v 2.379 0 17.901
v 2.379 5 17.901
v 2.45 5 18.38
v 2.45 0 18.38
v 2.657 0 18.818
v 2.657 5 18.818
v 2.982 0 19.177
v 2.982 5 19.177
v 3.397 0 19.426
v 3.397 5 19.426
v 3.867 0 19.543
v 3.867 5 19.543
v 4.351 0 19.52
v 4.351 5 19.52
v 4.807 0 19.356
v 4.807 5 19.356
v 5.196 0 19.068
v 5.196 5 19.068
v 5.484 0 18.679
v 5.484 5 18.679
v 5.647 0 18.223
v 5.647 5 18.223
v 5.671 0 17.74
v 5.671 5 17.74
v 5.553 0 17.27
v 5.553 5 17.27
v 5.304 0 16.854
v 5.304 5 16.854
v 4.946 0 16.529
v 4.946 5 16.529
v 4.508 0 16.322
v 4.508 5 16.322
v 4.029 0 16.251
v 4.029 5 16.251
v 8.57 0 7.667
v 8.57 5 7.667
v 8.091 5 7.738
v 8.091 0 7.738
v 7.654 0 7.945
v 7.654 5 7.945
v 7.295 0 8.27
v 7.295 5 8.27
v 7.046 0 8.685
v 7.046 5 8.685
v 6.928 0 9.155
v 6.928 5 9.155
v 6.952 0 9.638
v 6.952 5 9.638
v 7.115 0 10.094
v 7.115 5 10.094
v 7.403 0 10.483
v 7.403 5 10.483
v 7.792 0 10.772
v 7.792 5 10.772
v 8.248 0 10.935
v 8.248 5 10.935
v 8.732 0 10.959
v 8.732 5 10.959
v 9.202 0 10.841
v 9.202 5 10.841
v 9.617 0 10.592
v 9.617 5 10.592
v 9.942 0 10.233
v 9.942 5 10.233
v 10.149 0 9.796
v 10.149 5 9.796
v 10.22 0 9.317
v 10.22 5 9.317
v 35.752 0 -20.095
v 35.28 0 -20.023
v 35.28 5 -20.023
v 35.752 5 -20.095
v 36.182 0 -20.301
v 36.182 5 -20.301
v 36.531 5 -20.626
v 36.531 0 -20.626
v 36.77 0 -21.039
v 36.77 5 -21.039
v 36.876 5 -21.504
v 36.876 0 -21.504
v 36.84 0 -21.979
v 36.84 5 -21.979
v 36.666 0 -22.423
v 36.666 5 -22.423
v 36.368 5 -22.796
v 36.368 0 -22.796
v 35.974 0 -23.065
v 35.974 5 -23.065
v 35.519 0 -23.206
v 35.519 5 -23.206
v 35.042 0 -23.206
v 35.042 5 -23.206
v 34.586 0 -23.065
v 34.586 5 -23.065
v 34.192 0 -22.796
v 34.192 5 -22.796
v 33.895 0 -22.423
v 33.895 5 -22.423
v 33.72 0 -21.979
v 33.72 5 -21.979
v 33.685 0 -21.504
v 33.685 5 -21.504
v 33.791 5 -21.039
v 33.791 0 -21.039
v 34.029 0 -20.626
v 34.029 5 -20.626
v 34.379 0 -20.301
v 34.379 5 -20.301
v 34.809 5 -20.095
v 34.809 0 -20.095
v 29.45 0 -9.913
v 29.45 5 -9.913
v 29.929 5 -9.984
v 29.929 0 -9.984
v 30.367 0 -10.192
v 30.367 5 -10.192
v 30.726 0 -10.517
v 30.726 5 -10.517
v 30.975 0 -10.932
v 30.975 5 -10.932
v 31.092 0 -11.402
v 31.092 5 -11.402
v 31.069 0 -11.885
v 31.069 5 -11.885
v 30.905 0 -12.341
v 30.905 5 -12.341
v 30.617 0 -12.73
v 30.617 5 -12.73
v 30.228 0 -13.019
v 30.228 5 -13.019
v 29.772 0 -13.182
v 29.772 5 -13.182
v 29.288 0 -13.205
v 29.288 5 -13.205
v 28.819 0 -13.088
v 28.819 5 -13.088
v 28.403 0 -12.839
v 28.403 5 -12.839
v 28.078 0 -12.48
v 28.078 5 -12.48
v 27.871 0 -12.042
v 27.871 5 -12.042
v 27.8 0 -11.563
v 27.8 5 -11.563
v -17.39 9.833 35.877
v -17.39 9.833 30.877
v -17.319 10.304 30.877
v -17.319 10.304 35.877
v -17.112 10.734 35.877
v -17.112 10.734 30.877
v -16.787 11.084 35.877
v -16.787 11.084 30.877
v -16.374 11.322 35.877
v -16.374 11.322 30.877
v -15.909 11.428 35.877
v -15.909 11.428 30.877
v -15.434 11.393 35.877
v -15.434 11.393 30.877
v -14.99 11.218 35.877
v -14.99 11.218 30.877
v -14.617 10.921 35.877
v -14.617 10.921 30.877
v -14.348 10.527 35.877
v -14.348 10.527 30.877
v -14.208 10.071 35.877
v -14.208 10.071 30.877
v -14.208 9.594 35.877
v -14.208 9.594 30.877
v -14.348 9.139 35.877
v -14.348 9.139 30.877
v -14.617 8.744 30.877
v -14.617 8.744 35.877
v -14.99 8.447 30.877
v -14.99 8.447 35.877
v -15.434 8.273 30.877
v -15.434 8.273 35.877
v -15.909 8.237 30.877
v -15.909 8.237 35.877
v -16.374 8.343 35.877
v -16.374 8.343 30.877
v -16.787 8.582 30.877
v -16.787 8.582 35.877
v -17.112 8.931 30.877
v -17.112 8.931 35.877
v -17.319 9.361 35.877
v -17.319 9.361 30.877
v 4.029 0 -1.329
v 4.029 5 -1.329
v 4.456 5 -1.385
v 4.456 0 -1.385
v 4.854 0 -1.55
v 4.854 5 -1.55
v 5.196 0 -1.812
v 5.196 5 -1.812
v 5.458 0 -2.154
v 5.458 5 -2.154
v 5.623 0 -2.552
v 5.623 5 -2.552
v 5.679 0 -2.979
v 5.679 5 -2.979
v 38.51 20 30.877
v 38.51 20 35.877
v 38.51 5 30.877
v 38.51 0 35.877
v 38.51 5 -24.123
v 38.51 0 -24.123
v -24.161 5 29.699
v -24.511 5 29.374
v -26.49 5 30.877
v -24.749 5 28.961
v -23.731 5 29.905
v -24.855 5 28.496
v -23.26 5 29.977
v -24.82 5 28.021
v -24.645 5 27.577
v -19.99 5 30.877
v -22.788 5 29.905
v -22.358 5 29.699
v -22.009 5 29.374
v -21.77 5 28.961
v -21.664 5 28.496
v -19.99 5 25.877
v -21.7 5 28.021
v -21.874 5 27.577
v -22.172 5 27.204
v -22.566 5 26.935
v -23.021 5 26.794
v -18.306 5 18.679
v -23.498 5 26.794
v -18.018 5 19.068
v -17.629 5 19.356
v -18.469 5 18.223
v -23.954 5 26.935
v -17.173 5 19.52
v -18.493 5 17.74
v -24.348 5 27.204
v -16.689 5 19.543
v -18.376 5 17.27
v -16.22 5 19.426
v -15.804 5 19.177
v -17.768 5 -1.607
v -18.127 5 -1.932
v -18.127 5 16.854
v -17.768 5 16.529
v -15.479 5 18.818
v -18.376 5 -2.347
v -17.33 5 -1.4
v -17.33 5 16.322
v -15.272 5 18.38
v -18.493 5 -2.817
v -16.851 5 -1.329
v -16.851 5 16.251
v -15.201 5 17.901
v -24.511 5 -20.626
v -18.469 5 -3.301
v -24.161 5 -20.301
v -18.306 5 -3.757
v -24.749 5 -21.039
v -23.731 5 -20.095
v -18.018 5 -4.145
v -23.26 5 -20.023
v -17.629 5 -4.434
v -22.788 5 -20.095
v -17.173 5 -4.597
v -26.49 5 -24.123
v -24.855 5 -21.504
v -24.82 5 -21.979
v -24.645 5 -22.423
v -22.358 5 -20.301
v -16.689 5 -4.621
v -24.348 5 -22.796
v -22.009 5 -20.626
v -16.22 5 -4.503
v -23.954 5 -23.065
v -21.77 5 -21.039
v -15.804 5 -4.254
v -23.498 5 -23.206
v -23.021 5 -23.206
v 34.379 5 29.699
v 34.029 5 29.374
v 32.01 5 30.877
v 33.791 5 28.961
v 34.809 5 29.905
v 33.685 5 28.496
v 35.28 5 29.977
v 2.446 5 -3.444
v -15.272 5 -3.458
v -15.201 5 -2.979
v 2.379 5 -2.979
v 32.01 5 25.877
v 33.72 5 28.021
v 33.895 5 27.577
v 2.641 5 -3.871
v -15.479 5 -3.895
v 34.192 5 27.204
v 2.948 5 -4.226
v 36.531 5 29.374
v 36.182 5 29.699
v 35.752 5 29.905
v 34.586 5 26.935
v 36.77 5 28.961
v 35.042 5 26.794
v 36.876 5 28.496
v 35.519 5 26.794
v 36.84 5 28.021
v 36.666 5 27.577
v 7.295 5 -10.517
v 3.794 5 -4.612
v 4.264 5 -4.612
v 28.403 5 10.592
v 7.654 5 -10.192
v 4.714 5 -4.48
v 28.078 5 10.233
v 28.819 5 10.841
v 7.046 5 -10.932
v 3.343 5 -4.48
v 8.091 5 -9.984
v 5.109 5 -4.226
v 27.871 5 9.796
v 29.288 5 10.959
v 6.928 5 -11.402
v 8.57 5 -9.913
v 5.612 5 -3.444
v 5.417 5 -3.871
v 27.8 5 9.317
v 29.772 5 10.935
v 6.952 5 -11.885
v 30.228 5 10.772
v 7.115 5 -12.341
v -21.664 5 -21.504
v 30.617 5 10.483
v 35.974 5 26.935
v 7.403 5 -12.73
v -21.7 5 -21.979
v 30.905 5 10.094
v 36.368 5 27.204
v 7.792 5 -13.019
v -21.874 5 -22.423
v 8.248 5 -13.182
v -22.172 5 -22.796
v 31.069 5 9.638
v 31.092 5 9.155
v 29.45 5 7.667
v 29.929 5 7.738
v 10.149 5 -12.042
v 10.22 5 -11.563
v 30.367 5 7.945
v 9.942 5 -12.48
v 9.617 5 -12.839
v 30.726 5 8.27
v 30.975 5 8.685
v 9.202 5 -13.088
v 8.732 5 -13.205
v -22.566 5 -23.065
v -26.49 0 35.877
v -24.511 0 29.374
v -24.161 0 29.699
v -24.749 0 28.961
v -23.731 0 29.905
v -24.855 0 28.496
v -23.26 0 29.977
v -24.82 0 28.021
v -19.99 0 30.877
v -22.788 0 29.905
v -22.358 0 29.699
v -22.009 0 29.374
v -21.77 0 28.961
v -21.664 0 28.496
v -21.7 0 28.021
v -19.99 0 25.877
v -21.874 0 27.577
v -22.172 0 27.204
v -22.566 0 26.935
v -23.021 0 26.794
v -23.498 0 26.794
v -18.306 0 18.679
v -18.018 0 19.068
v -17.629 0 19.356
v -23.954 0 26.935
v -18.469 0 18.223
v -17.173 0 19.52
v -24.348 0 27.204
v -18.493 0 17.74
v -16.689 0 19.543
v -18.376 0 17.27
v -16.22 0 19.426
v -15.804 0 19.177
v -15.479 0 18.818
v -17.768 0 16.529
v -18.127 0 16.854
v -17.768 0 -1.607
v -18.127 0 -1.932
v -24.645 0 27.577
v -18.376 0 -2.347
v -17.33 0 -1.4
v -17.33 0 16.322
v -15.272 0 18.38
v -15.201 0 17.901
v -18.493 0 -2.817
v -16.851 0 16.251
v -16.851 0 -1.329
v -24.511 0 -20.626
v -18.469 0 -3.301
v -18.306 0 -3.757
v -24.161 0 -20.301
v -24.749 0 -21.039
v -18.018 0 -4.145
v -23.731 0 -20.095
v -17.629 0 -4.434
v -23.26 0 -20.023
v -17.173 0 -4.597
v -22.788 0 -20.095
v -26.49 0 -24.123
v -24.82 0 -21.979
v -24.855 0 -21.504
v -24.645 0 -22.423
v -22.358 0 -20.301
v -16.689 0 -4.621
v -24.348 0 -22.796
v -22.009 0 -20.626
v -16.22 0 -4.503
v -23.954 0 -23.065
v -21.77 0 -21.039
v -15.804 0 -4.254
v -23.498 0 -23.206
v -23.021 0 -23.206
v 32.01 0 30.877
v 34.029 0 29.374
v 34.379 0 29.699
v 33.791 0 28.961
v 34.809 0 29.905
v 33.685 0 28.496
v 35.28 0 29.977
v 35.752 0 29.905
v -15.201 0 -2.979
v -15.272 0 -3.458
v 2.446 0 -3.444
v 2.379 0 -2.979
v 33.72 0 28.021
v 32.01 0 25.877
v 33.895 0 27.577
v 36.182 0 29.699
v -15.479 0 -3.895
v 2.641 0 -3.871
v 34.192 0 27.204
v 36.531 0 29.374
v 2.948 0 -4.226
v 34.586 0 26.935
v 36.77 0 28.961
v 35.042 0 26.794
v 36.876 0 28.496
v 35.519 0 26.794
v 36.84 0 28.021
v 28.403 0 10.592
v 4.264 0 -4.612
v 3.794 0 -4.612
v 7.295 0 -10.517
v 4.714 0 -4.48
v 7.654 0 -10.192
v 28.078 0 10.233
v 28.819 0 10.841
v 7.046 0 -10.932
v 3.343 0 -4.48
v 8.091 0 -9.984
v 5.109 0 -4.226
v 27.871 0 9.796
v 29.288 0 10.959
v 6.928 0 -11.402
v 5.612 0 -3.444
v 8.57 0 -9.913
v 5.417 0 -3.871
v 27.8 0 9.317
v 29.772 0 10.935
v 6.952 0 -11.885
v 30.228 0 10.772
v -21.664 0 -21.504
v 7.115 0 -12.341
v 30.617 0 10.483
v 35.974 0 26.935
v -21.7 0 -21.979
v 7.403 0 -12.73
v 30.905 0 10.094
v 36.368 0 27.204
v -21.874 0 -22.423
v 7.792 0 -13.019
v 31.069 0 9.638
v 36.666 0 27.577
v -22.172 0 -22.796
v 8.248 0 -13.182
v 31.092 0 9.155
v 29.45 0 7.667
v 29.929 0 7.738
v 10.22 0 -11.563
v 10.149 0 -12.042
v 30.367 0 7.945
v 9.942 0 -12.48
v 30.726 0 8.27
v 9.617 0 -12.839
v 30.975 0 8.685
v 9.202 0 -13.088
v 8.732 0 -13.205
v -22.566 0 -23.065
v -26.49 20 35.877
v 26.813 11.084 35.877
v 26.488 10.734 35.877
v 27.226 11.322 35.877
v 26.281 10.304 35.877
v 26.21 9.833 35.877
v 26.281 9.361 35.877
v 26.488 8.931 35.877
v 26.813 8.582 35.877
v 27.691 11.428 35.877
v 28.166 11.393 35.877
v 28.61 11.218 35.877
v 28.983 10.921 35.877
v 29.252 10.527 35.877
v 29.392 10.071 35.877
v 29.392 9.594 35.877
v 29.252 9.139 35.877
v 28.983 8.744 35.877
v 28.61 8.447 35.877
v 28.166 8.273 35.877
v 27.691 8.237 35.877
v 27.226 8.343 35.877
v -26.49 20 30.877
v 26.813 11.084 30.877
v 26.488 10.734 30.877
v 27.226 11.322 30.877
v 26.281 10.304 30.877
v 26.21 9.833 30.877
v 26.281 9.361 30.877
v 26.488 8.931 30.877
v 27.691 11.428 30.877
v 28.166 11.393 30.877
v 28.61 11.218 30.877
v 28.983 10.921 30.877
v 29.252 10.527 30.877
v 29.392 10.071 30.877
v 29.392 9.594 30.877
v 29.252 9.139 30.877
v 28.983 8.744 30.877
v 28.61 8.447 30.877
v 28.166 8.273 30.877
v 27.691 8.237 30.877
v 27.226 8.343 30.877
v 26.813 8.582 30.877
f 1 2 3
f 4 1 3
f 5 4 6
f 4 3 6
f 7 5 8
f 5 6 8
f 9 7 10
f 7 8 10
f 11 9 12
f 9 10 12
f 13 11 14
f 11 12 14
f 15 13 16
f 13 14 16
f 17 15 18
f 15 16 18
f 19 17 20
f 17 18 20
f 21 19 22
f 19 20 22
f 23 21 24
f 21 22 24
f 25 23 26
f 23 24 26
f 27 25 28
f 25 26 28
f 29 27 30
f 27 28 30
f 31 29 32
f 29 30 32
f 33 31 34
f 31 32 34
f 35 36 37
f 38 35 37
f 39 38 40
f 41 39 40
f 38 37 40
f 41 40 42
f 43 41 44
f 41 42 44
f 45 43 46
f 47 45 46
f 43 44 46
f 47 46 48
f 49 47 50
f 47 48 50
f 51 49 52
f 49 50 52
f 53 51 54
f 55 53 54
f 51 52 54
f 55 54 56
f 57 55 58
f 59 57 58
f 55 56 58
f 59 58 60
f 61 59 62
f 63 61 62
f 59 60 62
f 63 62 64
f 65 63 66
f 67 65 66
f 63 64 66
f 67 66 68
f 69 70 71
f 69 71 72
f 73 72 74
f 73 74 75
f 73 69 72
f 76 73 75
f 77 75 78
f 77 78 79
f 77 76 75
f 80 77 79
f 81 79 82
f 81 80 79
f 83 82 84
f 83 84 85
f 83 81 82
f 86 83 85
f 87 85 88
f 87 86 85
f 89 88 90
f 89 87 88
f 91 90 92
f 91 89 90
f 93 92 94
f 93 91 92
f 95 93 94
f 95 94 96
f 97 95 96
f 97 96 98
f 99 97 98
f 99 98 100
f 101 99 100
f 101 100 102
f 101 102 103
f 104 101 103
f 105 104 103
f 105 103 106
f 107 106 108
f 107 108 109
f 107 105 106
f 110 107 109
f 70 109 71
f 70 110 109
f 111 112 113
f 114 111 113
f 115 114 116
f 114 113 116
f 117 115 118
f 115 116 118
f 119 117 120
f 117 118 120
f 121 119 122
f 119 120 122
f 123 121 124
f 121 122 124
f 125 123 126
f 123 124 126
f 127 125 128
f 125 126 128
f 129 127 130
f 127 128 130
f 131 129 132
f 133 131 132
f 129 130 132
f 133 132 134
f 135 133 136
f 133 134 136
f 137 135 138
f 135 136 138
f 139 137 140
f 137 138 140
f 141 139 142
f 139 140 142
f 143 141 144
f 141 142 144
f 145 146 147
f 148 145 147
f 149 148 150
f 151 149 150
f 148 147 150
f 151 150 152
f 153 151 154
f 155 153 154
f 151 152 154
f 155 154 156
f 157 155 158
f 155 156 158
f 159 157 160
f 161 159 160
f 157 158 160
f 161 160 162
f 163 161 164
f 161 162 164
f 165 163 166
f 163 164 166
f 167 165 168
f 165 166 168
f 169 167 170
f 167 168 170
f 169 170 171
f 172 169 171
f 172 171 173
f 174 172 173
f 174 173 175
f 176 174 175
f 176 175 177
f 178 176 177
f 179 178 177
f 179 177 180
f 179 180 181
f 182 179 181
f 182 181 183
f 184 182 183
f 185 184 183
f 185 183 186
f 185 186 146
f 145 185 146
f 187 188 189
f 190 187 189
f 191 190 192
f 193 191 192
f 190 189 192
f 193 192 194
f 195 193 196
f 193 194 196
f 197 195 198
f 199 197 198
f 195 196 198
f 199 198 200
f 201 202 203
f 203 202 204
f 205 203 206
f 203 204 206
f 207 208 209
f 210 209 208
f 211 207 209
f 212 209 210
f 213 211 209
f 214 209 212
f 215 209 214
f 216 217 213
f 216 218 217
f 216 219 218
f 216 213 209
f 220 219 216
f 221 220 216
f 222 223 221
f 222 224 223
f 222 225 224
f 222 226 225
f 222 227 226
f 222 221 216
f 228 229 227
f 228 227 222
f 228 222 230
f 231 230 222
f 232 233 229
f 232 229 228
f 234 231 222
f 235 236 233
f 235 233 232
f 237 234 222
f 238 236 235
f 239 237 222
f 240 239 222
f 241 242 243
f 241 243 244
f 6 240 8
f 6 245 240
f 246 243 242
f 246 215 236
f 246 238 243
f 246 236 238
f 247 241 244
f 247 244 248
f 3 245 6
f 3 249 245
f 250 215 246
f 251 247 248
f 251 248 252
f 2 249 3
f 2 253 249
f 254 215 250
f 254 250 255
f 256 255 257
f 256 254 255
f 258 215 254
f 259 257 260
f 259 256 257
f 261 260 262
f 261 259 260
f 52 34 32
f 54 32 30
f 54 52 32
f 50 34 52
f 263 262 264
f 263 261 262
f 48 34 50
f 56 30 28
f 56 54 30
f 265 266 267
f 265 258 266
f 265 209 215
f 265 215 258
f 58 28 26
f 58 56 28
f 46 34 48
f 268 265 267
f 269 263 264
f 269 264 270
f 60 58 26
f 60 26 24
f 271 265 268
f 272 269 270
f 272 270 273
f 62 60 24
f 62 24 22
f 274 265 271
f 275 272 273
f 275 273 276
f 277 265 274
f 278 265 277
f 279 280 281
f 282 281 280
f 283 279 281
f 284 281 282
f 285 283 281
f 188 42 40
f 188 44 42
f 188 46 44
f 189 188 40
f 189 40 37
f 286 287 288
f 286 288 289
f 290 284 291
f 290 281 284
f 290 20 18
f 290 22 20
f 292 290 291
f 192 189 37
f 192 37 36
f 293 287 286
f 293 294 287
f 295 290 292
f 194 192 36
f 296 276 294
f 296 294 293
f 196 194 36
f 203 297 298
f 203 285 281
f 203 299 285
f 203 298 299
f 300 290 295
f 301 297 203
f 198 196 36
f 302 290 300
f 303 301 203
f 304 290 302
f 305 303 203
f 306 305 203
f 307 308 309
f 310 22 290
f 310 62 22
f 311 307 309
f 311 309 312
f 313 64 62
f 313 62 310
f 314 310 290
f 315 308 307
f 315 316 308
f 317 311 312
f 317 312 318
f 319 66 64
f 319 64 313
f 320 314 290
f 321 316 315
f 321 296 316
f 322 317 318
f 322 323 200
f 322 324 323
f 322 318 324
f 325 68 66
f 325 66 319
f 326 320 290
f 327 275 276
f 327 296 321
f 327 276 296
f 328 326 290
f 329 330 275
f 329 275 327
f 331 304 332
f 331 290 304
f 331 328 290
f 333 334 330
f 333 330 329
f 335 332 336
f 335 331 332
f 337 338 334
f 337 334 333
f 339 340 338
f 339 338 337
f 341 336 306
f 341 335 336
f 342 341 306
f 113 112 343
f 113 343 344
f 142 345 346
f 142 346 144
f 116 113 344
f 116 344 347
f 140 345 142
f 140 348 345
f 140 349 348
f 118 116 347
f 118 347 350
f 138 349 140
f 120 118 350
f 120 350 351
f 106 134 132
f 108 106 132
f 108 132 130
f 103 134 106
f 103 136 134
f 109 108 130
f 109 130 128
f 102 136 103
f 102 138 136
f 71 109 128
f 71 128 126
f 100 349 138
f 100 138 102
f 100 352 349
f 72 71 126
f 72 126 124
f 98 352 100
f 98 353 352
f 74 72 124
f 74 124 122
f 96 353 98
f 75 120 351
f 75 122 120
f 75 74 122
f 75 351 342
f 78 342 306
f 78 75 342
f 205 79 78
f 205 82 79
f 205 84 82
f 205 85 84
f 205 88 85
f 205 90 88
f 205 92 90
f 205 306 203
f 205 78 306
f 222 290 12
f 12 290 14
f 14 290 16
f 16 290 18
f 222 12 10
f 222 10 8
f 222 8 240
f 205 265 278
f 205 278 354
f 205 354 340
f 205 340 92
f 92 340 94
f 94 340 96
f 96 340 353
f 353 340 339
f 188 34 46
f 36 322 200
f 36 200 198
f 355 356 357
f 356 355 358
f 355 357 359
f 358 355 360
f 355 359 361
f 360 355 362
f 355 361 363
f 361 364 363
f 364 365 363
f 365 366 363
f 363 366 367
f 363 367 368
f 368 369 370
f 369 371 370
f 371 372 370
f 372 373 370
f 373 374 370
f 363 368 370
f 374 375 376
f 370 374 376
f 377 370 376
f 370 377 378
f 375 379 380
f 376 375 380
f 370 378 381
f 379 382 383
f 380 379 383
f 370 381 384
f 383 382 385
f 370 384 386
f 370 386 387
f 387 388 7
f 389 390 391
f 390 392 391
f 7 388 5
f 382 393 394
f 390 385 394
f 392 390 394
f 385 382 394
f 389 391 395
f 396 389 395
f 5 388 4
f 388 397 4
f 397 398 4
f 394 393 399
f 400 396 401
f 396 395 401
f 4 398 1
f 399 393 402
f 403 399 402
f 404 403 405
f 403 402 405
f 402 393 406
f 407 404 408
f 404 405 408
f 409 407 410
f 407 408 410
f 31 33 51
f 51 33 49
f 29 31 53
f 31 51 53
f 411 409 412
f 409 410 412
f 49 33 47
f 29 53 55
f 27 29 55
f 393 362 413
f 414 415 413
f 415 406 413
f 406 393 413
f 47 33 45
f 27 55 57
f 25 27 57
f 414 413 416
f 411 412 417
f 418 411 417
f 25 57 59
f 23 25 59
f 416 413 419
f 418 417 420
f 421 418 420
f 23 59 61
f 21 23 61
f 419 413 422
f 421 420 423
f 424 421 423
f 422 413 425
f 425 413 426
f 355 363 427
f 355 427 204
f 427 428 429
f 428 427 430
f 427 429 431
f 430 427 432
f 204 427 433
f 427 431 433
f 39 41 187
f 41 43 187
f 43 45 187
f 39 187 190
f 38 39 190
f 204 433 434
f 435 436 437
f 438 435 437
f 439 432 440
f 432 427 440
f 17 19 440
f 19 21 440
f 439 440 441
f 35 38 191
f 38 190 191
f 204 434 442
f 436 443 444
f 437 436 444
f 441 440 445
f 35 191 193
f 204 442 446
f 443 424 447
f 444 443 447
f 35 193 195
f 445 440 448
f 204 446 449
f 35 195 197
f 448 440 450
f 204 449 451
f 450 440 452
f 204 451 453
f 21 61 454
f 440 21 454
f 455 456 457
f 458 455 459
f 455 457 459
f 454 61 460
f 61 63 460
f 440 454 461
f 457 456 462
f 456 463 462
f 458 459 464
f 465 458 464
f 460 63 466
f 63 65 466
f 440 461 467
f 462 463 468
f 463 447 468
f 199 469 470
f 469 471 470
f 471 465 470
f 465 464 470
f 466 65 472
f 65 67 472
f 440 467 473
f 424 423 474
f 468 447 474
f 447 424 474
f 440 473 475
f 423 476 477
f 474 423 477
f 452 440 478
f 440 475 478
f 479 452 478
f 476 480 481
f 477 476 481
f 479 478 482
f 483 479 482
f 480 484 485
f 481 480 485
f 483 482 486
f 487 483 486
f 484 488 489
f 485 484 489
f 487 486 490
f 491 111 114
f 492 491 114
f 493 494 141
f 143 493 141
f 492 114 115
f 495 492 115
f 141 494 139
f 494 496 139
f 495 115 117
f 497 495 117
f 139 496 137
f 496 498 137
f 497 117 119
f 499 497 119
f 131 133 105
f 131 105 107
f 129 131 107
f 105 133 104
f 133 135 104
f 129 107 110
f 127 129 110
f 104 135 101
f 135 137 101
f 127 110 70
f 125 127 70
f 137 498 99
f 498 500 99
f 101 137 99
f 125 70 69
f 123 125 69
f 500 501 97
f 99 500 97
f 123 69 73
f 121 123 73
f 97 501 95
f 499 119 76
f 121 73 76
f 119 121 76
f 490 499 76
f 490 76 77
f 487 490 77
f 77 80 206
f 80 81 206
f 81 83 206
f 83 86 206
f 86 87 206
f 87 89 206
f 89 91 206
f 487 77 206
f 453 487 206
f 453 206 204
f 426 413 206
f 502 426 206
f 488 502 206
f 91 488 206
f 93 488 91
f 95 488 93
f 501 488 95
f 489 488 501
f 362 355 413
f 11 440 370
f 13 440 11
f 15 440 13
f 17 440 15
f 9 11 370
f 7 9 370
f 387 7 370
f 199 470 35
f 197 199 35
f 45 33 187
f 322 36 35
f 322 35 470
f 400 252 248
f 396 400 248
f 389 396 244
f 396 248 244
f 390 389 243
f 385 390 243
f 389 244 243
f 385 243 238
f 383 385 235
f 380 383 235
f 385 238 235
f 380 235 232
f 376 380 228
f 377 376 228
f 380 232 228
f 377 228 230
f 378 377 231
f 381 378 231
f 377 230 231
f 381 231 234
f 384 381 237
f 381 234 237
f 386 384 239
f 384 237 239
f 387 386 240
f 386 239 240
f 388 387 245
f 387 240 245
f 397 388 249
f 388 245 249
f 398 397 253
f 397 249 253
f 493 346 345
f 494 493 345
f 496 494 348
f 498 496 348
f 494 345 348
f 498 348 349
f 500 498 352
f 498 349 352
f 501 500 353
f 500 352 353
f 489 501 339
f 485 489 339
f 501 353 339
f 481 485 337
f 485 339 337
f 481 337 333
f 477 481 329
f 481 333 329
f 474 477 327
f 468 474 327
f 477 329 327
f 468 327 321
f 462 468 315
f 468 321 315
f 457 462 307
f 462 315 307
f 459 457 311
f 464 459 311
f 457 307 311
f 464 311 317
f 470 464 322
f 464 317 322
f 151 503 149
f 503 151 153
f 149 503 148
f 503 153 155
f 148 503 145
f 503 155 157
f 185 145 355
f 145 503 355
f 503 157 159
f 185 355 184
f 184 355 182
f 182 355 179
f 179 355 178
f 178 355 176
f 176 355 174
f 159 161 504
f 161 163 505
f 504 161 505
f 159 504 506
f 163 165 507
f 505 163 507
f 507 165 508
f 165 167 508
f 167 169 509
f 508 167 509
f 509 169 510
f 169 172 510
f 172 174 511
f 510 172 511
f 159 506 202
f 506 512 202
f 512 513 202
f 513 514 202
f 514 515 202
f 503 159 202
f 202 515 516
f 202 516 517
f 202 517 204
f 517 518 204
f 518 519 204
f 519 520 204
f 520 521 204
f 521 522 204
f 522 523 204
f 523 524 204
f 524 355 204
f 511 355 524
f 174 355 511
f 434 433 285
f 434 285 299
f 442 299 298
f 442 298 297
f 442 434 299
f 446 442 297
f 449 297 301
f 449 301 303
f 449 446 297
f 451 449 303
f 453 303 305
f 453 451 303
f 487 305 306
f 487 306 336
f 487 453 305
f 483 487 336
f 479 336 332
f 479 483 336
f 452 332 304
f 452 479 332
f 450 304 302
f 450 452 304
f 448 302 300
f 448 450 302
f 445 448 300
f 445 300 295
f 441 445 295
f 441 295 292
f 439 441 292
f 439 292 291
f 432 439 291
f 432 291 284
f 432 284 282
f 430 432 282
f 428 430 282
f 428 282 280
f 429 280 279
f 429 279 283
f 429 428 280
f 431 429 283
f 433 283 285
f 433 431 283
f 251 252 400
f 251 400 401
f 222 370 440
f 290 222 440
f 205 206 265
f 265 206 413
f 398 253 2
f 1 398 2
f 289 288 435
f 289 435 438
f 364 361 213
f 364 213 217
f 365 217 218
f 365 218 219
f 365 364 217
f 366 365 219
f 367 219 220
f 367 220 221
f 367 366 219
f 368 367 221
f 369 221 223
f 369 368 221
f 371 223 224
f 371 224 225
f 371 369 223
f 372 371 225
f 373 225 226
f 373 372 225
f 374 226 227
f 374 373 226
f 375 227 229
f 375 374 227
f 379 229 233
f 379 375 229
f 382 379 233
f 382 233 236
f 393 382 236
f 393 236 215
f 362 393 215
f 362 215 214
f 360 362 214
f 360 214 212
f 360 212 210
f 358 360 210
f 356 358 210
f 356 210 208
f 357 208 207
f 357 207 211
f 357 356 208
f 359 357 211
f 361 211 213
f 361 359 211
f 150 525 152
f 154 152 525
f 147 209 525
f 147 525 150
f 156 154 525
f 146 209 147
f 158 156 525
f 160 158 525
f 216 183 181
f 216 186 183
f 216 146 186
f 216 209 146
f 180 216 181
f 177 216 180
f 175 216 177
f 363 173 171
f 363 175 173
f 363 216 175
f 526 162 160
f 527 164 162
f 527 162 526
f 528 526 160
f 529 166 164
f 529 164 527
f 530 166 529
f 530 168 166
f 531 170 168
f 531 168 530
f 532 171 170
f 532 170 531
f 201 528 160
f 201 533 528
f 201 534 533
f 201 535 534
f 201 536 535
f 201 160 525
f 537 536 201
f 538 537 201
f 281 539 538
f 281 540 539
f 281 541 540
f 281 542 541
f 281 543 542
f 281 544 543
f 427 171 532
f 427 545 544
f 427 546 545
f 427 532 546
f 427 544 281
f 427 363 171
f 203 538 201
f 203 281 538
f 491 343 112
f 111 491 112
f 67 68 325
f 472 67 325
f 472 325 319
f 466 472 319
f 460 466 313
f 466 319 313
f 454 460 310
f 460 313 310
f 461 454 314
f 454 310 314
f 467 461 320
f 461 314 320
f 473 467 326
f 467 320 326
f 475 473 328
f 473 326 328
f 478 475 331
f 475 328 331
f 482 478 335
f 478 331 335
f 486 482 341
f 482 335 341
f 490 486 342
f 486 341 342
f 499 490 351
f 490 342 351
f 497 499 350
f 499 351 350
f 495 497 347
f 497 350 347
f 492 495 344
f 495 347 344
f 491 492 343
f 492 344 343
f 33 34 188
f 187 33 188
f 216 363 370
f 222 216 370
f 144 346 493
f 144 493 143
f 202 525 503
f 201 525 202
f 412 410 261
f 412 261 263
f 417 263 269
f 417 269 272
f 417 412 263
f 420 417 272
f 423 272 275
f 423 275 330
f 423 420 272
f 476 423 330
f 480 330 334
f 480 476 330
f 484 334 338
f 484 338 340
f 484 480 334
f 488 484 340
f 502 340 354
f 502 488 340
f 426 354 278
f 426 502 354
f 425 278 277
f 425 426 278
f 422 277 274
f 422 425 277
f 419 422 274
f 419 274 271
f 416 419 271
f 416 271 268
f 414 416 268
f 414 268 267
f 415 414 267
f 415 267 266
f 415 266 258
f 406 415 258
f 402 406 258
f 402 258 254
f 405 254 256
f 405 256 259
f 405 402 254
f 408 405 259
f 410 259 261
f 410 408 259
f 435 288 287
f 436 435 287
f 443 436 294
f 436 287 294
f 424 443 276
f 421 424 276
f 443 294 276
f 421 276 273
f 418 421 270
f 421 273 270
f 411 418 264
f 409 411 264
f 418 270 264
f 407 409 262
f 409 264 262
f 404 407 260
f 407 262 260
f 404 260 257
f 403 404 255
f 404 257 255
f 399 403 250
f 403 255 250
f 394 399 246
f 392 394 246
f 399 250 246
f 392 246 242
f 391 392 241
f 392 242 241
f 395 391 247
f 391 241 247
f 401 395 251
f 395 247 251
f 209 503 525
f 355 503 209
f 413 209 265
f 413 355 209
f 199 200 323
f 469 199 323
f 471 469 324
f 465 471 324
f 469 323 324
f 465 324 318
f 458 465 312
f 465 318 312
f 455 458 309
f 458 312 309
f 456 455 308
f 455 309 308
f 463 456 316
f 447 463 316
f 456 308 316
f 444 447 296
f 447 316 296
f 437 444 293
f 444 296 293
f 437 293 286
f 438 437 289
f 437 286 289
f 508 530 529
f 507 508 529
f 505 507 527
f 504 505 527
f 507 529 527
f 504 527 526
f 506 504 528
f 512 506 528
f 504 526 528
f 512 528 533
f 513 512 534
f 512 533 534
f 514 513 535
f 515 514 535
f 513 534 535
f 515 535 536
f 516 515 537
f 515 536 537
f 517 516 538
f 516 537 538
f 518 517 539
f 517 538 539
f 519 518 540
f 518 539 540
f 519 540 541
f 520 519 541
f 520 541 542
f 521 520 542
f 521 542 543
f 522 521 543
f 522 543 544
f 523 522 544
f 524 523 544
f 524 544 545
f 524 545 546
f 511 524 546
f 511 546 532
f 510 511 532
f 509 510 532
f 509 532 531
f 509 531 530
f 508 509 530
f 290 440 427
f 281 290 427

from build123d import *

# Parameters (mm, degrees)
SKETCH_1_R          = 1.6
EXTRUDE_1_DEPTH     = 5
SKETCH_2_R          = 1.65
SKETCH_2_W          = 20.88
SKETCH_2_H          = 20.88
CUT_EXTRUDE_1_DEPTH = 5
SKETCH_4_W          = 65
SKETCH_4_H          = 5
EXTRUDE_2_DEPTH     = 5
SKETCH_5_W          = 65
SKETCH_5_H          = 5
EXTRUDE_3_DEPTH     = 15
SKETCH_6_R          = 1.6
CUT_EXTRUDE_2_DEPTH = 15


with BuildPart() as part:
    # 草图1 → 凸台-拉伸1 (new body)
    with BuildSketch(Plane(origin=(0, 0, 0), x_dir=(1, 0, 0), z_dir=(0, 1, 0))):
        Polygon((-19.989784722, -25.876557595), (32.010215278, -25.876557595), (32.010215278, -30.876557595), (38.510215278, -30.876557595), (38.510215278, 24.123442405), (-26.489784722, 24.123442405), (-26.489784722, -30.876557595), (-19.989784722, -30.876557595), align=None)
        with Locations(Location((-23.259784722, 21.623442405, 0), (0, 0, 270))):
            Circle(SKETCH_1_R, mode=Mode.SUBTRACT)
        with Locations(Location((-23.259784722, -28.376557595, 0), (0, 0, 270))):
            Circle(SKETCH_1_R, mode=Mode.SUBTRACT)
        with Locations(Location((35.280215278, -28.376557595, 0), (0, 0, 270))):
            Circle(SKETCH_1_R, mode=Mode.SUBTRACT)
        with Locations(Location((35.280215278, 21.623442405, 0), (0, 0, 270))):
            Circle(SKETCH_1_R, mode=Mode.SUBTRACT)
    extrude(amount=EXTRUDE_1_DEPTH)

    # 草图2 → 切除-拉伸1 (cut)
    with BuildSketch(Plane(origin=(0, 5, 0), x_dir=(1, 0, 0), z_dir=(0, 1, 0))):
        with BuildLine():
            ThreePointArc((5.678835194, 2.978753935), (4.028835194, 4.628753935), (2.378835194, 2.978753935))
            Line((2.378835194, 2.978753935), (4.028835194, 2.978753935))
            Line((4.028835194, 2.978753935), (4.028835194, 1.328753935))
            ThreePointArc((4.028835194, 1.328753935), (5.195561383, 1.812027746), (5.678835194, 2.978753935))
        make_face()
        with BuildLine():
            Line((4.028835194, 2.978753935), (2.378835194, 2.978753935))
            ThreePointArc((2.378835194, 2.978753935), (2.862109005, 1.812027746), (4.028835194, 1.328753935))
            Line((4.028835194, 1.328753935), (4.028835194, 2.978753935))
        make_face()
        with Locations((-16.851164806, -17.901246065)):
            Circle(SKETCH_2_R)
        with Locations((4.028835194, -17.901246065)):
            Circle(SKETCH_2_R)
        with Locations((4.028835194, 2.978753935)):
            Circle(SKETCH_2_R)
        with Locations((-16.851164806, 2.978753935)):
            Circle(SKETCH_2_R)
        with Locations((-6.411164806, -7.461246065)):
            Rectangle(SKETCH_2_W, SKETCH_2_H)
        with BuildLine():
            ThreePointArc((5.678835194, -17.901246065), (5.195561383, -16.734519876), (4.028835194, -16.251246065))
            Line((4.028835194, -16.251246065), (4.028835194, -17.901246065))
            Line((4.028835194, -17.901246065), (2.378835194, -17.901246065))
            ThreePointArc((2.378835194, -17.901246065), (4.028835194, -19.551246065), (5.678835194, -17.901246065))
        make_face()
        with BuildLine():
            Line((4.028835194, -17.901246065), (4.028835194, -16.251246065))
            ThreePointArc((4.028835194, -16.251246065), (2.862109005, -16.734519876), (2.378835194, -17.901246065))
            Line((2.378835194, -17.901246065), (4.028835194, -17.901246065))
        make_face()
        with BuildLine():
            ThreePointArc((-15.201164806, -17.901246065), (-15.684438617, -16.734519876), (-16.851164806, -16.251246065))
            Line((-16.851164806, -16.251246065), (-16.851164806, -17.901246065))
            Line((-16.851164806, -17.901246065), (-15.201164806, -17.901246065))
        make_face()
        with BuildLine():
            Line((-16.851164806, -17.901246065), (-16.851164806, -16.251246065))
            ThreePointArc((-16.851164806, -16.251246065), (-18.017890995, -19.067972254), (-15.201164806, -17.901246065))
            Line((-15.201164806, -17.901246065), (-16.851164806, -17.901246065))
        make_face()
        with BuildLine():
            ThreePointArc((10.220215278, -9.316557595), (9.736941467, -8.149831407), (8.570215278, -7.666557595))
            Line((8.570215278, -7.666557595), (8.570215278, -9.316557595))
            Line((8.570215278, -9.316557595), (10.220215278, -9.316557595))
        make_face()
        with BuildLine():
            Line((8.570215278, -9.316557595), (8.570215278, -7.666557595))
            ThreePointArc((8.570215278, -7.666557595), (7.403489089, -10.483283784), (10.220215278, -9.316557595))
            Line((10.220215278, -9.316557595), (8.570215278, -9.316557595))
        make_face()
        with Locations((8.570215278, -9.316557595)):
            Circle(SKETCH_2_R)
        with Locations((29.450215278, -9.316557595)):
            Circle(SKETCH_2_R)
        with Locations((29.450215278, 11.563442405)):
            Circle(SKETCH_2_R)
        with Locations((8.570215278, 11.563442405)):
            Circle(SKETCH_2_R)
        with Locations((19.010215278, 1.123442405)):
            Rectangle(SKETCH_2_W, SKETCH_2_H)
        with BuildLine():
            ThreePointArc((31.100215278, 11.563442405), (29.450215278, 13.213442405), (27.800215278, 11.563442405))
            Line((27.800215278, 11.563442405), (29.450215278, 11.563442405))
            Line((29.450215278, 11.563442405), (29.450215278, 9.913442405))
            ThreePointArc((29.450215278, 9.913442405), (30.616941467, 10.396716216), (31.100215278, 11.563442405))
        make_face()
        with BuildLine():
            Line((29.450215278, 11.563442405), (27.800215278, 11.563442405))
            ThreePointArc((27.800215278, 11.563442405), (28.283489089, 10.396716216), (29.450215278, 9.913442405))
            Line((29.450215278, 9.913442405), (29.450215278, 11.563442405))
        make_face()
        with BuildLine():
            ThreePointArc((31.100215278, -9.316557595), (30.616941467, -8.149831407), (29.450215278, -7.666557595))
            Line((29.450215278, -7.666557595), (29.450215278, -9.316557595))
            Line((29.450215278, -9.316557595), (27.800215278, -9.316557595))
            ThreePointArc((27.800215278, -9.316557595), (29.450215278, -10.966557595), (31.100215278, -9.316557595))
        make_face()
        with BuildLine():
            Line((29.450215278, -9.316557595), (29.450215278, -7.666557595))
            ThreePointArc((29.450215278, -7.666557595), (28.283489089, -8.149831407), (27.800215278, -9.316557595))
            Line((27.800215278, -9.316557595), (29.450215278, -9.316557595))
        make_face()
    extrude(amount=-CUT_EXTRUDE_1_DEPTH, mode=Mode.SUBTRACT)

    # 草图4 → 凸台-拉伸2 (add)
    with BuildSketch(Plane.XY.offset(30.876557595)):
        with Locations((6.010215278, 2.5)):
            Rectangle(SKETCH_4_W, SKETCH_4_H)
    extrude(amount=EXTRUDE_2_DEPTH)

    # 草图5 → 凸台-拉伸3 (add)
    with BuildSketch(Plane(origin=(0, 5, 0), x_dir=(1, 0, 0), z_dir=(0, 1, 0))):
        with Locations((6.010215278, -33.376557595)):
            Rectangle(SKETCH_5_W, SKETCH_5_H)
    extrude(amount=EXTRUDE_3_DEPTH)

    # 草图6 → 切除-拉伸2 (cut)
    with BuildSketch(Plane(origin=(0, 0, 30.876557595), x_dir=(-1, 0, 0), z_dir=(0, 0, -1))):
        with Locations((-27.810215278, 9.832763387)):
            Circle(SKETCH_6_R)
        with Locations((15.789784722, 9.832763387)):
            Circle(SKETCH_6_R)
    extrude(amount=-CUT_EXTRUDE_2_DEPTH, mode=Mode.SUBTRACT)


solid = part.part
